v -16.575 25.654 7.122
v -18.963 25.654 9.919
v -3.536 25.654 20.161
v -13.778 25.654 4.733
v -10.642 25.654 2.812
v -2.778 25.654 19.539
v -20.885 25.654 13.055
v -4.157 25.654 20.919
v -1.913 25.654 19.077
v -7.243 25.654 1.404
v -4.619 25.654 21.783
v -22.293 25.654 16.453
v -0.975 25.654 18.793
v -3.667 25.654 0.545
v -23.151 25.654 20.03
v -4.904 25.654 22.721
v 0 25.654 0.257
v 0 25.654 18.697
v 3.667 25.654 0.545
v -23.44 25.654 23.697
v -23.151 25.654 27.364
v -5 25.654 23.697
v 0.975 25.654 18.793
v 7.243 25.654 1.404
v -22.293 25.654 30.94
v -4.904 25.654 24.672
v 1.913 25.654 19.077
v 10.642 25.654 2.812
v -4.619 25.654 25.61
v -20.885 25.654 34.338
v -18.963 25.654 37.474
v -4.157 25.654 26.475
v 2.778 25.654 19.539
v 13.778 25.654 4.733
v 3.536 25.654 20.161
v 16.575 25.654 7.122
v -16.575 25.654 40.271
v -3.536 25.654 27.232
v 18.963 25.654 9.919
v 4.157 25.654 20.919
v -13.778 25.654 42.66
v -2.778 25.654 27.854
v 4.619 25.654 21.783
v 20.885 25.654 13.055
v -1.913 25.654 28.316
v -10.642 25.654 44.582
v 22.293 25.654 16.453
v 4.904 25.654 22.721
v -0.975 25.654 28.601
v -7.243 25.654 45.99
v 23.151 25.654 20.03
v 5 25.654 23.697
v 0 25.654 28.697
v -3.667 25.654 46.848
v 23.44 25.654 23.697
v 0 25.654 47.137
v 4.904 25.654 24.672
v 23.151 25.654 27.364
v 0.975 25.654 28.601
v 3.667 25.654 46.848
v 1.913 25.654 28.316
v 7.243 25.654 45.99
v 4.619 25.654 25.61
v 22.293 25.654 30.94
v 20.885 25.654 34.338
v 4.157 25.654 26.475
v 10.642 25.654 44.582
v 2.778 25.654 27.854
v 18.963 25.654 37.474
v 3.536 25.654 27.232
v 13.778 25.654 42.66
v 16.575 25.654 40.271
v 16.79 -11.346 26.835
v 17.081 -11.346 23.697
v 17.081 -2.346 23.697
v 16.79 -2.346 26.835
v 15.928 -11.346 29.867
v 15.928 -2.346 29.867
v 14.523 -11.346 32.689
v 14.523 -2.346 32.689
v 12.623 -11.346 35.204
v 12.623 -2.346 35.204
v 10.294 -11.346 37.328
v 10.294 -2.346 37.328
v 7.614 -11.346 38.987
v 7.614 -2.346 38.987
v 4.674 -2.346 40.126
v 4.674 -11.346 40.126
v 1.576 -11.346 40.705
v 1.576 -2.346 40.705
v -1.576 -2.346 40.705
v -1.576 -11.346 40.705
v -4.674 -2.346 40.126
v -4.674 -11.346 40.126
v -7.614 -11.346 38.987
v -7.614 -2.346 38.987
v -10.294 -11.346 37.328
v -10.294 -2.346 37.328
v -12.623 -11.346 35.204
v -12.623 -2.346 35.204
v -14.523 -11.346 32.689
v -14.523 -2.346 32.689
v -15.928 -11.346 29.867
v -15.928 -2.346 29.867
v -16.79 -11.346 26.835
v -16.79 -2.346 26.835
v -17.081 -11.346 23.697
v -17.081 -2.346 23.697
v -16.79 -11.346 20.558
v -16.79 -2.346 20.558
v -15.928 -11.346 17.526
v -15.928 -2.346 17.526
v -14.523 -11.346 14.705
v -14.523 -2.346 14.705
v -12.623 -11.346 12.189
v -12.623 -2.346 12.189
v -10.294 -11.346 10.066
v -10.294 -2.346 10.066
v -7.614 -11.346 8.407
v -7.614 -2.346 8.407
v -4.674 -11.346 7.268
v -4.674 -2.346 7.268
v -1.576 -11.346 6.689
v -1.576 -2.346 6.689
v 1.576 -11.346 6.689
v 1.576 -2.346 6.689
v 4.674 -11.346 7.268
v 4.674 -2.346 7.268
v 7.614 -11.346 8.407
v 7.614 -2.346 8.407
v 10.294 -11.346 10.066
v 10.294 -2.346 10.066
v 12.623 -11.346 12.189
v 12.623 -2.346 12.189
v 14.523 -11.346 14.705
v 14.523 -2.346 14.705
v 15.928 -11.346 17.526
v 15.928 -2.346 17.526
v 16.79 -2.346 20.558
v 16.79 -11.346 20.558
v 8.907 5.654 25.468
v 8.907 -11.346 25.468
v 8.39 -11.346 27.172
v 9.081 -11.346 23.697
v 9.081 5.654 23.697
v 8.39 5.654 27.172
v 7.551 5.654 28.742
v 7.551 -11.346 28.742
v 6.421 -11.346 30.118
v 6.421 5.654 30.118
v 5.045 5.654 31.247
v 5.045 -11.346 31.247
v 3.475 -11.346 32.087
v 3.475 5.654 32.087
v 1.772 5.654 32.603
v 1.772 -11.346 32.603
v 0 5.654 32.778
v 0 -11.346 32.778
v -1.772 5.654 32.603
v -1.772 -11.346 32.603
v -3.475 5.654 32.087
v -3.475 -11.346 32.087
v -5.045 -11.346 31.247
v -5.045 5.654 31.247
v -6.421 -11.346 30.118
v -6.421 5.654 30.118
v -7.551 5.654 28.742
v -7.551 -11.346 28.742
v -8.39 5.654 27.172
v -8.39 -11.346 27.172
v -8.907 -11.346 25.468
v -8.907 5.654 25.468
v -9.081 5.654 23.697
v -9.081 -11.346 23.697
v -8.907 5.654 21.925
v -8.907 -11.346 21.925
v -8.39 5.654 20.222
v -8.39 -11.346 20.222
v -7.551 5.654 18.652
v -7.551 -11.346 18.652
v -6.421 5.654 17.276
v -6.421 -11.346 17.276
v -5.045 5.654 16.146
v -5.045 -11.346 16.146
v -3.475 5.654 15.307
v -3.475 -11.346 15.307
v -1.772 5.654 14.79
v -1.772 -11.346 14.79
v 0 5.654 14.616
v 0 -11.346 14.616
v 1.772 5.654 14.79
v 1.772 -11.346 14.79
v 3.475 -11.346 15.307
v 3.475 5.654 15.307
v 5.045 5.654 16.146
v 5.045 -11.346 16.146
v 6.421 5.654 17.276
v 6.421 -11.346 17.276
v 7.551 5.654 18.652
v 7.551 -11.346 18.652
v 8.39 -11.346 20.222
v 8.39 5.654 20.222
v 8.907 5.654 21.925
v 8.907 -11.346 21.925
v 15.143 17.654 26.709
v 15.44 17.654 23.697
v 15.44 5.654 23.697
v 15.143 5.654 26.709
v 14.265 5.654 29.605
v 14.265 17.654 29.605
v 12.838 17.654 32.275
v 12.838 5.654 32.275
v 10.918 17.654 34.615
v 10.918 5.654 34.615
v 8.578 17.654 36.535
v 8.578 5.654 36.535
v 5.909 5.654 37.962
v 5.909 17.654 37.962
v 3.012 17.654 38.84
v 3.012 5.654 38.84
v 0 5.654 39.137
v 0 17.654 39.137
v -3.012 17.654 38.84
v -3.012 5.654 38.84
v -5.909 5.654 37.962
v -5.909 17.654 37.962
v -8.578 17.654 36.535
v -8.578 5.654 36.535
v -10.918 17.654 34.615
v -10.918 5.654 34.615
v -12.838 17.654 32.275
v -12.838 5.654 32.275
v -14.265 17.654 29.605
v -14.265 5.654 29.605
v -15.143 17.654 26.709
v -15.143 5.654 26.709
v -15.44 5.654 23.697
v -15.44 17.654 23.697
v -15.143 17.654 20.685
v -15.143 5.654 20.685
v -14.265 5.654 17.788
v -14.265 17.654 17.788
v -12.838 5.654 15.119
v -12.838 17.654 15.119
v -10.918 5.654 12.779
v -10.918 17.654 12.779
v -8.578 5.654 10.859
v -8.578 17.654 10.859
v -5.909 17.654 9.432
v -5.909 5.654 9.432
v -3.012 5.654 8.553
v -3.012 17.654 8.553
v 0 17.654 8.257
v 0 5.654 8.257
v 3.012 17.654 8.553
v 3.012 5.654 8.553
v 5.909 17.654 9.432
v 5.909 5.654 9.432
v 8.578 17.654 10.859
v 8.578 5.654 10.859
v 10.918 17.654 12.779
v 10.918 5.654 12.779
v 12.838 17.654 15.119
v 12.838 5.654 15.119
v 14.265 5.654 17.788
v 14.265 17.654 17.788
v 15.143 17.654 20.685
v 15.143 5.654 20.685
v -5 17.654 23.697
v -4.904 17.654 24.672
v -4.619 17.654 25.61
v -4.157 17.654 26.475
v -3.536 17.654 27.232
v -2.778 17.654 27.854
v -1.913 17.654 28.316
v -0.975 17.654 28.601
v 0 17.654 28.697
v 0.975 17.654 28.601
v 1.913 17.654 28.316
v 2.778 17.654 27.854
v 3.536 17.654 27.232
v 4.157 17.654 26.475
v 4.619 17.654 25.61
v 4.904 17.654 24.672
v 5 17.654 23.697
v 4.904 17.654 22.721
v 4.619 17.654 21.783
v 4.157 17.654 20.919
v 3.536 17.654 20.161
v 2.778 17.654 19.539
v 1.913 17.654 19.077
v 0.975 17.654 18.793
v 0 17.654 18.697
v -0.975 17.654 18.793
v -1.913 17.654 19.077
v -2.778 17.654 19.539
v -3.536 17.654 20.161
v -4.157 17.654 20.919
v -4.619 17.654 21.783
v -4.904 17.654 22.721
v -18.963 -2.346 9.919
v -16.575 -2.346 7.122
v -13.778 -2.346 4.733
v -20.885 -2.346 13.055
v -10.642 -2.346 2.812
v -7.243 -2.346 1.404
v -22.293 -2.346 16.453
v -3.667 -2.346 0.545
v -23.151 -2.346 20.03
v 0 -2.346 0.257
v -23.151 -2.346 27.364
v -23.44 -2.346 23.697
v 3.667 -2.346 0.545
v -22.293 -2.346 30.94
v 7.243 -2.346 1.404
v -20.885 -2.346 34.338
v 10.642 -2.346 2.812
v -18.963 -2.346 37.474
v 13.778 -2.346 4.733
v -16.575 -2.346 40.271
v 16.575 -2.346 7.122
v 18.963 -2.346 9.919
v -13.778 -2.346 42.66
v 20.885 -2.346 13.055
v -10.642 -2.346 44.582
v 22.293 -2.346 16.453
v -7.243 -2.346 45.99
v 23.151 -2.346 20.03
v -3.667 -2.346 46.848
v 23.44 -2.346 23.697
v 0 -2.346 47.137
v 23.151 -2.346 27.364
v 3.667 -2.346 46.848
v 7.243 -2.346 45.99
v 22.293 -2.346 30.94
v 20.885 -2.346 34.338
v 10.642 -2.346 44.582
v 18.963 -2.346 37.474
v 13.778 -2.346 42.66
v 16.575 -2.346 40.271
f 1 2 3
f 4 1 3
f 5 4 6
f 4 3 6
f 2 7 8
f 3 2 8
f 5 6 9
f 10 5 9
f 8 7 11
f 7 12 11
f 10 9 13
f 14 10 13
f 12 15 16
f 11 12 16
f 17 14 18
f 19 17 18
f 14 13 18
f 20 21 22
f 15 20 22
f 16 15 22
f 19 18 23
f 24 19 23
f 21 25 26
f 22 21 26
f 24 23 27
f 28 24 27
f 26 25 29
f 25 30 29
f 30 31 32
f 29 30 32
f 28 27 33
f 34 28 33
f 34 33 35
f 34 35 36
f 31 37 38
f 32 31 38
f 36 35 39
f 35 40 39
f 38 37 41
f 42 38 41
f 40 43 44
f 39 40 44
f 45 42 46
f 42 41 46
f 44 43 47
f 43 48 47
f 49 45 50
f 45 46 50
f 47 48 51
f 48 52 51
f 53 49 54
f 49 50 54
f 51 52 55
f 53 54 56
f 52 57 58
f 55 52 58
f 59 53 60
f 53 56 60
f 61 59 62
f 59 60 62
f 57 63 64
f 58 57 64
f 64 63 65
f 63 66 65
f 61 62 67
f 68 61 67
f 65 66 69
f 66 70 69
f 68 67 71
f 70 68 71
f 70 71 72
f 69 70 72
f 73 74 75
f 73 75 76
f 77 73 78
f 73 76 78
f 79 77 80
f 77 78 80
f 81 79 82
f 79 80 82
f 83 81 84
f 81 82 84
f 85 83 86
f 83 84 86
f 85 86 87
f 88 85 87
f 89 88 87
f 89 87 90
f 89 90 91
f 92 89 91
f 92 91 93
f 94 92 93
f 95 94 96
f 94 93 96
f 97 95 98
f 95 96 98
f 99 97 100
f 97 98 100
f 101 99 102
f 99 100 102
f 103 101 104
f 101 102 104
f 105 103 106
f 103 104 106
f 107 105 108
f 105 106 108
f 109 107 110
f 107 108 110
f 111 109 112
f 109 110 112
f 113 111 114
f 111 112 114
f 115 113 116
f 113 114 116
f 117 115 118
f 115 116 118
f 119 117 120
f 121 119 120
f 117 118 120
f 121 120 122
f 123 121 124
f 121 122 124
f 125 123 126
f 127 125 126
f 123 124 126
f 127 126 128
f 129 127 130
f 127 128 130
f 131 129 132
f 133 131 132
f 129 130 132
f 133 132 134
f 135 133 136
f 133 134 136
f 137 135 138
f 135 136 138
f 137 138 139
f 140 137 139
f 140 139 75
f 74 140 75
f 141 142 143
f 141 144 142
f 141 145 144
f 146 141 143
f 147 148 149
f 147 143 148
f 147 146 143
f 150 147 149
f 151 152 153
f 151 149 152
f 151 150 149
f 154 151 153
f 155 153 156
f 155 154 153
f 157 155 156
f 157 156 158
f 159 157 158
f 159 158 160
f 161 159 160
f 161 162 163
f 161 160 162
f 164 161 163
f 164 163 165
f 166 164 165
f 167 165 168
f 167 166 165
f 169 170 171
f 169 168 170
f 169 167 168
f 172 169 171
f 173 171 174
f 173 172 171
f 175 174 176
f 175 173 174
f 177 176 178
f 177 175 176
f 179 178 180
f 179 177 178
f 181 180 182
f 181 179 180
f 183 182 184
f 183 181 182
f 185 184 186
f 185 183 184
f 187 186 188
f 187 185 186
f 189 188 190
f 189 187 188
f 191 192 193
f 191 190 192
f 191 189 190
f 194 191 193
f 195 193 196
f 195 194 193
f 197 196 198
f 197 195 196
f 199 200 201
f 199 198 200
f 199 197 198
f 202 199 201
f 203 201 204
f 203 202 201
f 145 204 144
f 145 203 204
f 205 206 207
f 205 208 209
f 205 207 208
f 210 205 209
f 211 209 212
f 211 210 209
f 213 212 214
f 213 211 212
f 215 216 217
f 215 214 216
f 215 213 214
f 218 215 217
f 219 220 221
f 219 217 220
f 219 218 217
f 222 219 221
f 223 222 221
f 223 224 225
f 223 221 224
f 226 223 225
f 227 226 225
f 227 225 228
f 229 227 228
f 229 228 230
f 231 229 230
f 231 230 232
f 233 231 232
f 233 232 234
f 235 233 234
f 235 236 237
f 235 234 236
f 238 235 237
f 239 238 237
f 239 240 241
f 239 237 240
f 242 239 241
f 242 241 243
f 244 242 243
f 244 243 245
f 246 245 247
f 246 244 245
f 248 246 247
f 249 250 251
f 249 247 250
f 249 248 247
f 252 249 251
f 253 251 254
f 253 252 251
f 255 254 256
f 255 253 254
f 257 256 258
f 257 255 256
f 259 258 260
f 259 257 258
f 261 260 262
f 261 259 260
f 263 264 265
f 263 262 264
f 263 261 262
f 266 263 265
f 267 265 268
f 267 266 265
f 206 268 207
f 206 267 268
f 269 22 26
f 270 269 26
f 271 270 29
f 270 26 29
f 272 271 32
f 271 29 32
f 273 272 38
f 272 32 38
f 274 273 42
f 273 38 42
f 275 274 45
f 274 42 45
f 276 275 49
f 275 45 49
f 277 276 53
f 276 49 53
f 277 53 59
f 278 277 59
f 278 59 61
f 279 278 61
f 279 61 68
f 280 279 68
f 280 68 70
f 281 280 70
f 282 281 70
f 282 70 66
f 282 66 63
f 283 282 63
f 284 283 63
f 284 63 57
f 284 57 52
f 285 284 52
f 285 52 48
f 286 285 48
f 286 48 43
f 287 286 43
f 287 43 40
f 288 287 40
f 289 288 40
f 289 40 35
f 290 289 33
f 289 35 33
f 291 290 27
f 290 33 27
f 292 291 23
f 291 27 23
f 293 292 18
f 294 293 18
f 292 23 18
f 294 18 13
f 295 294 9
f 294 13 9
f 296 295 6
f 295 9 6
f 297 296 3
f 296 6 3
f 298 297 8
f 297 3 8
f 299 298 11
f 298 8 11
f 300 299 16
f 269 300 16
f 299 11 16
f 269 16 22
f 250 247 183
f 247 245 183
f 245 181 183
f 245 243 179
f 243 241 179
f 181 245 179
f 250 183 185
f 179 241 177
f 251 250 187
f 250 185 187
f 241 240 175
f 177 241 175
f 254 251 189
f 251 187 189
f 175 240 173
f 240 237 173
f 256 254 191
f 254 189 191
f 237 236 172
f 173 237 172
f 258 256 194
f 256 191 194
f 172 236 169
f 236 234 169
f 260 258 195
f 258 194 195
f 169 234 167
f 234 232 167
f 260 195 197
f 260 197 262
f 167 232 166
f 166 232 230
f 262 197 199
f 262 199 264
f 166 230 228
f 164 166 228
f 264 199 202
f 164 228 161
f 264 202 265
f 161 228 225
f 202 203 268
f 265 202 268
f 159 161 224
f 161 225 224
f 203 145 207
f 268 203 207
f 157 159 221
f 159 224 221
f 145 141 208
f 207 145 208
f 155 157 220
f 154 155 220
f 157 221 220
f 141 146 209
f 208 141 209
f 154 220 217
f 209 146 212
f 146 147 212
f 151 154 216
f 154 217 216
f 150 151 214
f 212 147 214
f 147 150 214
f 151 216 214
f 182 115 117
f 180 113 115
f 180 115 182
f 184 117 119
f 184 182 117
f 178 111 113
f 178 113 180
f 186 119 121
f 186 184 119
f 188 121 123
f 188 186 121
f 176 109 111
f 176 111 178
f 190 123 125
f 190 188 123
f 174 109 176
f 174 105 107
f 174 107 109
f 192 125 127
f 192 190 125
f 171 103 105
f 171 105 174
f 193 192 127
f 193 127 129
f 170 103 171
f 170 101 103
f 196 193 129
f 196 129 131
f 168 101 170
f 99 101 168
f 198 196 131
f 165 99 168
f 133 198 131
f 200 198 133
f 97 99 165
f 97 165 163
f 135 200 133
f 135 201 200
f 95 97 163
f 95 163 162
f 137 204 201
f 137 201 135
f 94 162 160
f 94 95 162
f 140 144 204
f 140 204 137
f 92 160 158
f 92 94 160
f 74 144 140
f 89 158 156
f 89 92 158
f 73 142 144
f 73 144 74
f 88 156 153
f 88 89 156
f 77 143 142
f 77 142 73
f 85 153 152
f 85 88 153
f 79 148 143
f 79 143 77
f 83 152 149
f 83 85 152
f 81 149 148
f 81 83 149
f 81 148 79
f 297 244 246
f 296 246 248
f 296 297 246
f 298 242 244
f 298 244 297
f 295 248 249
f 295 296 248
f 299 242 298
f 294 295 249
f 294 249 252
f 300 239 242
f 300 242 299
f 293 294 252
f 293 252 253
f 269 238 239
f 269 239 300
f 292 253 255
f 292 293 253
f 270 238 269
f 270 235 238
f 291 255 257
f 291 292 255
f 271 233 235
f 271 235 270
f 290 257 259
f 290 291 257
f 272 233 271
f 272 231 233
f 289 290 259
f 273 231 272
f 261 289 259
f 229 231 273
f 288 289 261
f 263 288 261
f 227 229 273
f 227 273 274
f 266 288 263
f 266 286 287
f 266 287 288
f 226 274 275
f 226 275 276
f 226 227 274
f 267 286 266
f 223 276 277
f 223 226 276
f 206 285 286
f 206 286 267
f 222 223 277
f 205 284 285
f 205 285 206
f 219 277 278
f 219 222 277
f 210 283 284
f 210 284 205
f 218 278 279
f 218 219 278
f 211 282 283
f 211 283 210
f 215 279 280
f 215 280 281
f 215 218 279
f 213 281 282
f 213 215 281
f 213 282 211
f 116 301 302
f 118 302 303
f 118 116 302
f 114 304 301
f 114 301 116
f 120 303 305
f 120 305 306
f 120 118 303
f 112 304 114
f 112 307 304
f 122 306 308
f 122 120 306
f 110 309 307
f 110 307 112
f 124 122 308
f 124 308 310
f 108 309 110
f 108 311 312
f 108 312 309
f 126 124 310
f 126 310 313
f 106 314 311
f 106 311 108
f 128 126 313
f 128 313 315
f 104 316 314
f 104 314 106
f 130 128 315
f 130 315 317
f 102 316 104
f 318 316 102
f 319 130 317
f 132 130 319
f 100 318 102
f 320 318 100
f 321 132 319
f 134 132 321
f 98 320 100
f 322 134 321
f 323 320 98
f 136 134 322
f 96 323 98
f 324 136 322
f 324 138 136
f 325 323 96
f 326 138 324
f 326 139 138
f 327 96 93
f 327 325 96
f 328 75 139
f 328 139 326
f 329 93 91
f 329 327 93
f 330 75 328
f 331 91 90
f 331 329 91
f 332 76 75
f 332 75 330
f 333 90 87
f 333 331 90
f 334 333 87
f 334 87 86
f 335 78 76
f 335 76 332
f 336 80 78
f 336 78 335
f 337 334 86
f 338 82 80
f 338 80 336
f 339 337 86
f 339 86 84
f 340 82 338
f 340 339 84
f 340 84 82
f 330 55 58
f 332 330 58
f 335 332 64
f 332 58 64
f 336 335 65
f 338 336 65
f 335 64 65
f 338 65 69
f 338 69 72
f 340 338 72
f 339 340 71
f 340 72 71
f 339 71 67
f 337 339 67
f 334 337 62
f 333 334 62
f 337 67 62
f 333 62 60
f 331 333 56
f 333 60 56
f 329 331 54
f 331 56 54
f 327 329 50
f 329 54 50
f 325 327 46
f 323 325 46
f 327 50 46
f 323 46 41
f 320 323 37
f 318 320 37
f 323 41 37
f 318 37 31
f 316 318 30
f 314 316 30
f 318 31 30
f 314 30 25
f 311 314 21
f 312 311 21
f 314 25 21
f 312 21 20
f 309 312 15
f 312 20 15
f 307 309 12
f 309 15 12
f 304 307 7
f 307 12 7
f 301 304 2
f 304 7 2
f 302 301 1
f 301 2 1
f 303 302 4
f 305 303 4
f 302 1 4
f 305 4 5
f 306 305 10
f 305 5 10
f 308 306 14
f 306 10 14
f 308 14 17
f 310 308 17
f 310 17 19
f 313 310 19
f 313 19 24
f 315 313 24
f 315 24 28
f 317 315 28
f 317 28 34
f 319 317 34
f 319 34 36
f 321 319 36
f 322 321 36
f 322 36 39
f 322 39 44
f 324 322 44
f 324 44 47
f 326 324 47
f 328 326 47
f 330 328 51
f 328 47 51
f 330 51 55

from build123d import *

# Parameters (mm, degrees)
F0_R     = 23.4400047289
F1_DEPTH = 28
F3_R     = 17.0810137282
F4_DEPTH = 9
F5_T     = -8
F6_D     = 10


with BuildPart() as f1:
    # F0 (on Front) → F1 (new body)
    with BuildSketch(Plane.XZ):
        with Locations((0, 23.6968044192)):
            Circle(F0_R)
    extrude(amount=F1_DEPTH)


with BuildPart() as f1_1:
    # F2: moved
    add(f1.part.moved(Location((0, 25.654, 0))))

    # F3 (on face) → F4 (join)
    with BuildSketch(Plane.XZ.offset(2.346)):
        with Locations((0, 23.6968044192)):
            Circle(F3_R)
    extrude(amount=F4_DEPTH)

    # F5
    f5_openings = [f1_1.faces().sort_by_distance(p)[0] for p in [
        (0, -11.346, 23.696804),
    ]]
    offset(amount=F5_T, openings=f5_openings, kind=Kind.INTERSECTION)

    # F6 (through all)
    with Locations(Plane.XZ):
        with Locations((0, 23.6968044192)):
            Hole(F6_D / 2)


solid = f1_1.part
